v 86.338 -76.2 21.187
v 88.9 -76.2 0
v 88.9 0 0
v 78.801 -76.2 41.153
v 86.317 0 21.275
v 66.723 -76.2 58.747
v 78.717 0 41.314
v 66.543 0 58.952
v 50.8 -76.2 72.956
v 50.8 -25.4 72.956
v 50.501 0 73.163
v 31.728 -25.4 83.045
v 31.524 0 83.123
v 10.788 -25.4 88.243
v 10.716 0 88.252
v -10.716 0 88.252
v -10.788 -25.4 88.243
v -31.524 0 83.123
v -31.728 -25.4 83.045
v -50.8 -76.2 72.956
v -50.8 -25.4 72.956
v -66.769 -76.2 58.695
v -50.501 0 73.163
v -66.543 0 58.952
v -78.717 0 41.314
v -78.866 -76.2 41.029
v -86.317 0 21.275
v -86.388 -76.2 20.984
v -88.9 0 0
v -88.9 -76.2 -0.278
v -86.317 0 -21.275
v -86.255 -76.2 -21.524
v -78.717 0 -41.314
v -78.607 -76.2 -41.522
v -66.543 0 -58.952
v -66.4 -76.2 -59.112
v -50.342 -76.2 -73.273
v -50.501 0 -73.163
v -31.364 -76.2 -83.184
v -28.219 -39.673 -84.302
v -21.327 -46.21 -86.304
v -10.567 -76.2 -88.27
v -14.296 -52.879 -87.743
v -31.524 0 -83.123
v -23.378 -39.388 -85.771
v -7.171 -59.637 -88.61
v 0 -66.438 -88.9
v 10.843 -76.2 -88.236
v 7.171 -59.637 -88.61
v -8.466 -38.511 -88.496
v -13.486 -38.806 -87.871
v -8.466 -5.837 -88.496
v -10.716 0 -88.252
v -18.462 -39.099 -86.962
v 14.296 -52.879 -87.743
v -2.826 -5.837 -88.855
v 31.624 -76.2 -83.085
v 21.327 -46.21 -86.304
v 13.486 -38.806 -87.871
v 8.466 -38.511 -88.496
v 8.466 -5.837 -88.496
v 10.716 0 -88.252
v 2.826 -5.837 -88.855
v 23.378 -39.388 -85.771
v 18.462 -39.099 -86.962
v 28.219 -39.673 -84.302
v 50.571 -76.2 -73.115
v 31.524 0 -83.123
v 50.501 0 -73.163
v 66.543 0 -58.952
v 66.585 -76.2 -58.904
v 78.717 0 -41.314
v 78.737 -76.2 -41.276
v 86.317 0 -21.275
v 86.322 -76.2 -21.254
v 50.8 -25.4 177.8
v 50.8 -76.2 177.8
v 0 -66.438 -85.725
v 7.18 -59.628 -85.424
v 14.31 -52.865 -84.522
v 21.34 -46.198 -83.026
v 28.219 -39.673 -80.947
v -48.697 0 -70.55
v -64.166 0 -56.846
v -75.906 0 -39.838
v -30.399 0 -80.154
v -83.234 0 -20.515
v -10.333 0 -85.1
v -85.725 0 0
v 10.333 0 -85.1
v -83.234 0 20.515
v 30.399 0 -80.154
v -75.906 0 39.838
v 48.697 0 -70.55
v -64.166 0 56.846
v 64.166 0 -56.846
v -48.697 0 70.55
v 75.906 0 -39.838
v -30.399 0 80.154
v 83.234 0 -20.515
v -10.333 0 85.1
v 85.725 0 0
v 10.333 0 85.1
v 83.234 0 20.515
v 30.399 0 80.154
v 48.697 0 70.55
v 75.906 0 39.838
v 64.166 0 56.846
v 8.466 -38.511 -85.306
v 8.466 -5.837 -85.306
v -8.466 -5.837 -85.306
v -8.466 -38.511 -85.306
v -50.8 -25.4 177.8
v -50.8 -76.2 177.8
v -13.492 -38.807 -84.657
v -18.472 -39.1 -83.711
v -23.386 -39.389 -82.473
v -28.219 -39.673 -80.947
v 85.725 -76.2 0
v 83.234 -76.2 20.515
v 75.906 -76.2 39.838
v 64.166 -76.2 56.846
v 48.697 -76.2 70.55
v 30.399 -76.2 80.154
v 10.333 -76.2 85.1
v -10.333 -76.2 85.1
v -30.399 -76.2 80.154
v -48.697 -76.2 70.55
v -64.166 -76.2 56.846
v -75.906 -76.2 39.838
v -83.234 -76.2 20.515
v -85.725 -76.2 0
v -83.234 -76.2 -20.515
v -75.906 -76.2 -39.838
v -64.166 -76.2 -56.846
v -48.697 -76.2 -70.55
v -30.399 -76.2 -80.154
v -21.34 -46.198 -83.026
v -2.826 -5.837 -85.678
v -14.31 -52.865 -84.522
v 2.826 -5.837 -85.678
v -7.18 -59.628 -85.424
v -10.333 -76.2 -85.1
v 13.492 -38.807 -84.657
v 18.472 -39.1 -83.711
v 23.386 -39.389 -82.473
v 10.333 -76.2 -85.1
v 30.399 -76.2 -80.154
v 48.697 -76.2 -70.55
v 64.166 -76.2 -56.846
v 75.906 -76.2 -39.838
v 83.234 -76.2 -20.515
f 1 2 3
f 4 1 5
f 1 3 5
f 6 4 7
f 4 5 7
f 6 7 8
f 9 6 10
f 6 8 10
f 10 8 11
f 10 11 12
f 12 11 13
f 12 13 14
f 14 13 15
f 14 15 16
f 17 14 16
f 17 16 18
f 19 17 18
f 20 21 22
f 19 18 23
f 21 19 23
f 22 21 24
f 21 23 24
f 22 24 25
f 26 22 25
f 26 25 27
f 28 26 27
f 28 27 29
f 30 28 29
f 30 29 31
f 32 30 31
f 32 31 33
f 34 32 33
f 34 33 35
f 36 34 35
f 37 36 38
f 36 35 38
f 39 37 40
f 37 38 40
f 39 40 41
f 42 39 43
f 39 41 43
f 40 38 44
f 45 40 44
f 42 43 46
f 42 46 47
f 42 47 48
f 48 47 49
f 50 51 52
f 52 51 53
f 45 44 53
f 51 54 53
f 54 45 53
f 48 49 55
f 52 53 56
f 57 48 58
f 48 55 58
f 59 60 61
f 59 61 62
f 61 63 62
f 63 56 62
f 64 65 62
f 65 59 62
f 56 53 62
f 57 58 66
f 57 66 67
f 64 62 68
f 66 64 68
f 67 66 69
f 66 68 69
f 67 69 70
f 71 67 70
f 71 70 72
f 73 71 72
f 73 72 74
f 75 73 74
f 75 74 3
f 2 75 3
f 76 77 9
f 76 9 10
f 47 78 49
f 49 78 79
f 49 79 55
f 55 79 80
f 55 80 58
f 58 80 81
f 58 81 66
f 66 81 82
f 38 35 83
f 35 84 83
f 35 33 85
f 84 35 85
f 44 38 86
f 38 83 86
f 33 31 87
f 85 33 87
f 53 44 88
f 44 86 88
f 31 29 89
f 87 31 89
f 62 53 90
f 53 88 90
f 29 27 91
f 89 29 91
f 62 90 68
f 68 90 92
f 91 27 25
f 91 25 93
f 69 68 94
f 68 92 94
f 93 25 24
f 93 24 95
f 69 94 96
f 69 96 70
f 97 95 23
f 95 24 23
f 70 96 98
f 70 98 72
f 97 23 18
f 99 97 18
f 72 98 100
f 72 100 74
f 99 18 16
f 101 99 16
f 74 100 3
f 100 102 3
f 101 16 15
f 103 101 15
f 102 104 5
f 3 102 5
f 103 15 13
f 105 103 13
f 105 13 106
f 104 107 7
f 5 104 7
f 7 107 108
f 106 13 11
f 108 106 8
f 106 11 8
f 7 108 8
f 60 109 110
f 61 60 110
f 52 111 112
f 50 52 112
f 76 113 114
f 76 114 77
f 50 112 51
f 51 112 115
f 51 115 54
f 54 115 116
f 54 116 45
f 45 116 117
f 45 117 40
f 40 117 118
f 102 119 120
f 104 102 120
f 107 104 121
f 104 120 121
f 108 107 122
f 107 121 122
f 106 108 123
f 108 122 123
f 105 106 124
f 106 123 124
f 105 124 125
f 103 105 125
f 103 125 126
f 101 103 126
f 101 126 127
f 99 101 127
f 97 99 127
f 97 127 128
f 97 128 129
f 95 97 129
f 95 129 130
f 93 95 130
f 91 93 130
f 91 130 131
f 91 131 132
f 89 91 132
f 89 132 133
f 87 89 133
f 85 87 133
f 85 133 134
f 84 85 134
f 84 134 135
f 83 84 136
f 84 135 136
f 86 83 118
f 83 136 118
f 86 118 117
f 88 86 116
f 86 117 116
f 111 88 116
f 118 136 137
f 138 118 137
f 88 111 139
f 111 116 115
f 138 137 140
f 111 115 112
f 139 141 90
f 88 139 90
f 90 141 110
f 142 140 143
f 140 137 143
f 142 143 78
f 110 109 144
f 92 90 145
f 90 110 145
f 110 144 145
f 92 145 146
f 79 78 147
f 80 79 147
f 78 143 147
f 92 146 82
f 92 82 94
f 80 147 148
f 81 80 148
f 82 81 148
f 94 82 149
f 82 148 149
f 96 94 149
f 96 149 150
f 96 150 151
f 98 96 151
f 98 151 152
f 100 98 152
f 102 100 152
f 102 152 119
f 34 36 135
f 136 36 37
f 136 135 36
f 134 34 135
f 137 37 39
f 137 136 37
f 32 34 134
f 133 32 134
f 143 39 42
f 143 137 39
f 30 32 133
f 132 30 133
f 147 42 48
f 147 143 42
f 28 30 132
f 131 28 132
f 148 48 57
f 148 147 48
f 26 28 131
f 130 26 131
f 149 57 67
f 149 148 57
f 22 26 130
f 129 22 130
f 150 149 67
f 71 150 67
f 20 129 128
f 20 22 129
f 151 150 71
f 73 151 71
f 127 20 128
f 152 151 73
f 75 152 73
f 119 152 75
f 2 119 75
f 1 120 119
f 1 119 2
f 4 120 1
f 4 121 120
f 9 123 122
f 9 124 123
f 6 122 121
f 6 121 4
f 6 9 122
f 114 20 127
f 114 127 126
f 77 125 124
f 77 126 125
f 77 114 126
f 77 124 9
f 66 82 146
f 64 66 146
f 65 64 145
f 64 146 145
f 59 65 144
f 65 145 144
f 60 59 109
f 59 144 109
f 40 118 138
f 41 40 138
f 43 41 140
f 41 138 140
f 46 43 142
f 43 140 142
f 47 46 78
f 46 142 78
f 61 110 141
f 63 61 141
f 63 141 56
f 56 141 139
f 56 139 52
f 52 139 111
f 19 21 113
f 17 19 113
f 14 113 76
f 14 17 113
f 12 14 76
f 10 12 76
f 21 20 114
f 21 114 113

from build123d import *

# Parameters (mm, degrees)
F0_R     = 88.9
F1_DEPTH = 76.2
F2_W     = 101.6
F2_H     = 50.8
F3_DEPTH = 177.8
F5_DEPTH = 304.8
F6_R     = 85.725
F7_DEPTH = 76.201


with BuildPart() as f1:
    # F0 (on Front) → F1 (new body)
    with BuildSketch(Plane.XZ):
        Circle(F0_R)
    extrude(amount=F1_DEPTH)

    # F2 (on Top) → F3 (join)
    with BuildSketch(Plane.XY):
        with Locations((0, -50.8)):
            Rectangle(F2_W, F2_H)
    extrude(amount=F3_DEPTH)

    # F4 (on Top) → F5 (cut)
    with BuildSketch(Plane.XY):
        Polygon((8.465788, -5.836729), (0, -5.836729), (-8.465788, -5.836729), (-8.465788, -38.511038), (-28.219294, -39.673008), (0, -66.438295), (28.219294, -39.673008), (8.465788, -38.511038), align=None)
    extrude(amount=-F5_DEPTH, mode=Mode.SUBTRACT)

    # F6 (on face) → F7 (cut, through all)
    with BuildSketch(Plane.XZ.offset(76.2)):
        Circle(F6_R)
    extrude(amount=-F7_DEPTH, mode=Mode.SUBTRACT)


solid = f1.part
